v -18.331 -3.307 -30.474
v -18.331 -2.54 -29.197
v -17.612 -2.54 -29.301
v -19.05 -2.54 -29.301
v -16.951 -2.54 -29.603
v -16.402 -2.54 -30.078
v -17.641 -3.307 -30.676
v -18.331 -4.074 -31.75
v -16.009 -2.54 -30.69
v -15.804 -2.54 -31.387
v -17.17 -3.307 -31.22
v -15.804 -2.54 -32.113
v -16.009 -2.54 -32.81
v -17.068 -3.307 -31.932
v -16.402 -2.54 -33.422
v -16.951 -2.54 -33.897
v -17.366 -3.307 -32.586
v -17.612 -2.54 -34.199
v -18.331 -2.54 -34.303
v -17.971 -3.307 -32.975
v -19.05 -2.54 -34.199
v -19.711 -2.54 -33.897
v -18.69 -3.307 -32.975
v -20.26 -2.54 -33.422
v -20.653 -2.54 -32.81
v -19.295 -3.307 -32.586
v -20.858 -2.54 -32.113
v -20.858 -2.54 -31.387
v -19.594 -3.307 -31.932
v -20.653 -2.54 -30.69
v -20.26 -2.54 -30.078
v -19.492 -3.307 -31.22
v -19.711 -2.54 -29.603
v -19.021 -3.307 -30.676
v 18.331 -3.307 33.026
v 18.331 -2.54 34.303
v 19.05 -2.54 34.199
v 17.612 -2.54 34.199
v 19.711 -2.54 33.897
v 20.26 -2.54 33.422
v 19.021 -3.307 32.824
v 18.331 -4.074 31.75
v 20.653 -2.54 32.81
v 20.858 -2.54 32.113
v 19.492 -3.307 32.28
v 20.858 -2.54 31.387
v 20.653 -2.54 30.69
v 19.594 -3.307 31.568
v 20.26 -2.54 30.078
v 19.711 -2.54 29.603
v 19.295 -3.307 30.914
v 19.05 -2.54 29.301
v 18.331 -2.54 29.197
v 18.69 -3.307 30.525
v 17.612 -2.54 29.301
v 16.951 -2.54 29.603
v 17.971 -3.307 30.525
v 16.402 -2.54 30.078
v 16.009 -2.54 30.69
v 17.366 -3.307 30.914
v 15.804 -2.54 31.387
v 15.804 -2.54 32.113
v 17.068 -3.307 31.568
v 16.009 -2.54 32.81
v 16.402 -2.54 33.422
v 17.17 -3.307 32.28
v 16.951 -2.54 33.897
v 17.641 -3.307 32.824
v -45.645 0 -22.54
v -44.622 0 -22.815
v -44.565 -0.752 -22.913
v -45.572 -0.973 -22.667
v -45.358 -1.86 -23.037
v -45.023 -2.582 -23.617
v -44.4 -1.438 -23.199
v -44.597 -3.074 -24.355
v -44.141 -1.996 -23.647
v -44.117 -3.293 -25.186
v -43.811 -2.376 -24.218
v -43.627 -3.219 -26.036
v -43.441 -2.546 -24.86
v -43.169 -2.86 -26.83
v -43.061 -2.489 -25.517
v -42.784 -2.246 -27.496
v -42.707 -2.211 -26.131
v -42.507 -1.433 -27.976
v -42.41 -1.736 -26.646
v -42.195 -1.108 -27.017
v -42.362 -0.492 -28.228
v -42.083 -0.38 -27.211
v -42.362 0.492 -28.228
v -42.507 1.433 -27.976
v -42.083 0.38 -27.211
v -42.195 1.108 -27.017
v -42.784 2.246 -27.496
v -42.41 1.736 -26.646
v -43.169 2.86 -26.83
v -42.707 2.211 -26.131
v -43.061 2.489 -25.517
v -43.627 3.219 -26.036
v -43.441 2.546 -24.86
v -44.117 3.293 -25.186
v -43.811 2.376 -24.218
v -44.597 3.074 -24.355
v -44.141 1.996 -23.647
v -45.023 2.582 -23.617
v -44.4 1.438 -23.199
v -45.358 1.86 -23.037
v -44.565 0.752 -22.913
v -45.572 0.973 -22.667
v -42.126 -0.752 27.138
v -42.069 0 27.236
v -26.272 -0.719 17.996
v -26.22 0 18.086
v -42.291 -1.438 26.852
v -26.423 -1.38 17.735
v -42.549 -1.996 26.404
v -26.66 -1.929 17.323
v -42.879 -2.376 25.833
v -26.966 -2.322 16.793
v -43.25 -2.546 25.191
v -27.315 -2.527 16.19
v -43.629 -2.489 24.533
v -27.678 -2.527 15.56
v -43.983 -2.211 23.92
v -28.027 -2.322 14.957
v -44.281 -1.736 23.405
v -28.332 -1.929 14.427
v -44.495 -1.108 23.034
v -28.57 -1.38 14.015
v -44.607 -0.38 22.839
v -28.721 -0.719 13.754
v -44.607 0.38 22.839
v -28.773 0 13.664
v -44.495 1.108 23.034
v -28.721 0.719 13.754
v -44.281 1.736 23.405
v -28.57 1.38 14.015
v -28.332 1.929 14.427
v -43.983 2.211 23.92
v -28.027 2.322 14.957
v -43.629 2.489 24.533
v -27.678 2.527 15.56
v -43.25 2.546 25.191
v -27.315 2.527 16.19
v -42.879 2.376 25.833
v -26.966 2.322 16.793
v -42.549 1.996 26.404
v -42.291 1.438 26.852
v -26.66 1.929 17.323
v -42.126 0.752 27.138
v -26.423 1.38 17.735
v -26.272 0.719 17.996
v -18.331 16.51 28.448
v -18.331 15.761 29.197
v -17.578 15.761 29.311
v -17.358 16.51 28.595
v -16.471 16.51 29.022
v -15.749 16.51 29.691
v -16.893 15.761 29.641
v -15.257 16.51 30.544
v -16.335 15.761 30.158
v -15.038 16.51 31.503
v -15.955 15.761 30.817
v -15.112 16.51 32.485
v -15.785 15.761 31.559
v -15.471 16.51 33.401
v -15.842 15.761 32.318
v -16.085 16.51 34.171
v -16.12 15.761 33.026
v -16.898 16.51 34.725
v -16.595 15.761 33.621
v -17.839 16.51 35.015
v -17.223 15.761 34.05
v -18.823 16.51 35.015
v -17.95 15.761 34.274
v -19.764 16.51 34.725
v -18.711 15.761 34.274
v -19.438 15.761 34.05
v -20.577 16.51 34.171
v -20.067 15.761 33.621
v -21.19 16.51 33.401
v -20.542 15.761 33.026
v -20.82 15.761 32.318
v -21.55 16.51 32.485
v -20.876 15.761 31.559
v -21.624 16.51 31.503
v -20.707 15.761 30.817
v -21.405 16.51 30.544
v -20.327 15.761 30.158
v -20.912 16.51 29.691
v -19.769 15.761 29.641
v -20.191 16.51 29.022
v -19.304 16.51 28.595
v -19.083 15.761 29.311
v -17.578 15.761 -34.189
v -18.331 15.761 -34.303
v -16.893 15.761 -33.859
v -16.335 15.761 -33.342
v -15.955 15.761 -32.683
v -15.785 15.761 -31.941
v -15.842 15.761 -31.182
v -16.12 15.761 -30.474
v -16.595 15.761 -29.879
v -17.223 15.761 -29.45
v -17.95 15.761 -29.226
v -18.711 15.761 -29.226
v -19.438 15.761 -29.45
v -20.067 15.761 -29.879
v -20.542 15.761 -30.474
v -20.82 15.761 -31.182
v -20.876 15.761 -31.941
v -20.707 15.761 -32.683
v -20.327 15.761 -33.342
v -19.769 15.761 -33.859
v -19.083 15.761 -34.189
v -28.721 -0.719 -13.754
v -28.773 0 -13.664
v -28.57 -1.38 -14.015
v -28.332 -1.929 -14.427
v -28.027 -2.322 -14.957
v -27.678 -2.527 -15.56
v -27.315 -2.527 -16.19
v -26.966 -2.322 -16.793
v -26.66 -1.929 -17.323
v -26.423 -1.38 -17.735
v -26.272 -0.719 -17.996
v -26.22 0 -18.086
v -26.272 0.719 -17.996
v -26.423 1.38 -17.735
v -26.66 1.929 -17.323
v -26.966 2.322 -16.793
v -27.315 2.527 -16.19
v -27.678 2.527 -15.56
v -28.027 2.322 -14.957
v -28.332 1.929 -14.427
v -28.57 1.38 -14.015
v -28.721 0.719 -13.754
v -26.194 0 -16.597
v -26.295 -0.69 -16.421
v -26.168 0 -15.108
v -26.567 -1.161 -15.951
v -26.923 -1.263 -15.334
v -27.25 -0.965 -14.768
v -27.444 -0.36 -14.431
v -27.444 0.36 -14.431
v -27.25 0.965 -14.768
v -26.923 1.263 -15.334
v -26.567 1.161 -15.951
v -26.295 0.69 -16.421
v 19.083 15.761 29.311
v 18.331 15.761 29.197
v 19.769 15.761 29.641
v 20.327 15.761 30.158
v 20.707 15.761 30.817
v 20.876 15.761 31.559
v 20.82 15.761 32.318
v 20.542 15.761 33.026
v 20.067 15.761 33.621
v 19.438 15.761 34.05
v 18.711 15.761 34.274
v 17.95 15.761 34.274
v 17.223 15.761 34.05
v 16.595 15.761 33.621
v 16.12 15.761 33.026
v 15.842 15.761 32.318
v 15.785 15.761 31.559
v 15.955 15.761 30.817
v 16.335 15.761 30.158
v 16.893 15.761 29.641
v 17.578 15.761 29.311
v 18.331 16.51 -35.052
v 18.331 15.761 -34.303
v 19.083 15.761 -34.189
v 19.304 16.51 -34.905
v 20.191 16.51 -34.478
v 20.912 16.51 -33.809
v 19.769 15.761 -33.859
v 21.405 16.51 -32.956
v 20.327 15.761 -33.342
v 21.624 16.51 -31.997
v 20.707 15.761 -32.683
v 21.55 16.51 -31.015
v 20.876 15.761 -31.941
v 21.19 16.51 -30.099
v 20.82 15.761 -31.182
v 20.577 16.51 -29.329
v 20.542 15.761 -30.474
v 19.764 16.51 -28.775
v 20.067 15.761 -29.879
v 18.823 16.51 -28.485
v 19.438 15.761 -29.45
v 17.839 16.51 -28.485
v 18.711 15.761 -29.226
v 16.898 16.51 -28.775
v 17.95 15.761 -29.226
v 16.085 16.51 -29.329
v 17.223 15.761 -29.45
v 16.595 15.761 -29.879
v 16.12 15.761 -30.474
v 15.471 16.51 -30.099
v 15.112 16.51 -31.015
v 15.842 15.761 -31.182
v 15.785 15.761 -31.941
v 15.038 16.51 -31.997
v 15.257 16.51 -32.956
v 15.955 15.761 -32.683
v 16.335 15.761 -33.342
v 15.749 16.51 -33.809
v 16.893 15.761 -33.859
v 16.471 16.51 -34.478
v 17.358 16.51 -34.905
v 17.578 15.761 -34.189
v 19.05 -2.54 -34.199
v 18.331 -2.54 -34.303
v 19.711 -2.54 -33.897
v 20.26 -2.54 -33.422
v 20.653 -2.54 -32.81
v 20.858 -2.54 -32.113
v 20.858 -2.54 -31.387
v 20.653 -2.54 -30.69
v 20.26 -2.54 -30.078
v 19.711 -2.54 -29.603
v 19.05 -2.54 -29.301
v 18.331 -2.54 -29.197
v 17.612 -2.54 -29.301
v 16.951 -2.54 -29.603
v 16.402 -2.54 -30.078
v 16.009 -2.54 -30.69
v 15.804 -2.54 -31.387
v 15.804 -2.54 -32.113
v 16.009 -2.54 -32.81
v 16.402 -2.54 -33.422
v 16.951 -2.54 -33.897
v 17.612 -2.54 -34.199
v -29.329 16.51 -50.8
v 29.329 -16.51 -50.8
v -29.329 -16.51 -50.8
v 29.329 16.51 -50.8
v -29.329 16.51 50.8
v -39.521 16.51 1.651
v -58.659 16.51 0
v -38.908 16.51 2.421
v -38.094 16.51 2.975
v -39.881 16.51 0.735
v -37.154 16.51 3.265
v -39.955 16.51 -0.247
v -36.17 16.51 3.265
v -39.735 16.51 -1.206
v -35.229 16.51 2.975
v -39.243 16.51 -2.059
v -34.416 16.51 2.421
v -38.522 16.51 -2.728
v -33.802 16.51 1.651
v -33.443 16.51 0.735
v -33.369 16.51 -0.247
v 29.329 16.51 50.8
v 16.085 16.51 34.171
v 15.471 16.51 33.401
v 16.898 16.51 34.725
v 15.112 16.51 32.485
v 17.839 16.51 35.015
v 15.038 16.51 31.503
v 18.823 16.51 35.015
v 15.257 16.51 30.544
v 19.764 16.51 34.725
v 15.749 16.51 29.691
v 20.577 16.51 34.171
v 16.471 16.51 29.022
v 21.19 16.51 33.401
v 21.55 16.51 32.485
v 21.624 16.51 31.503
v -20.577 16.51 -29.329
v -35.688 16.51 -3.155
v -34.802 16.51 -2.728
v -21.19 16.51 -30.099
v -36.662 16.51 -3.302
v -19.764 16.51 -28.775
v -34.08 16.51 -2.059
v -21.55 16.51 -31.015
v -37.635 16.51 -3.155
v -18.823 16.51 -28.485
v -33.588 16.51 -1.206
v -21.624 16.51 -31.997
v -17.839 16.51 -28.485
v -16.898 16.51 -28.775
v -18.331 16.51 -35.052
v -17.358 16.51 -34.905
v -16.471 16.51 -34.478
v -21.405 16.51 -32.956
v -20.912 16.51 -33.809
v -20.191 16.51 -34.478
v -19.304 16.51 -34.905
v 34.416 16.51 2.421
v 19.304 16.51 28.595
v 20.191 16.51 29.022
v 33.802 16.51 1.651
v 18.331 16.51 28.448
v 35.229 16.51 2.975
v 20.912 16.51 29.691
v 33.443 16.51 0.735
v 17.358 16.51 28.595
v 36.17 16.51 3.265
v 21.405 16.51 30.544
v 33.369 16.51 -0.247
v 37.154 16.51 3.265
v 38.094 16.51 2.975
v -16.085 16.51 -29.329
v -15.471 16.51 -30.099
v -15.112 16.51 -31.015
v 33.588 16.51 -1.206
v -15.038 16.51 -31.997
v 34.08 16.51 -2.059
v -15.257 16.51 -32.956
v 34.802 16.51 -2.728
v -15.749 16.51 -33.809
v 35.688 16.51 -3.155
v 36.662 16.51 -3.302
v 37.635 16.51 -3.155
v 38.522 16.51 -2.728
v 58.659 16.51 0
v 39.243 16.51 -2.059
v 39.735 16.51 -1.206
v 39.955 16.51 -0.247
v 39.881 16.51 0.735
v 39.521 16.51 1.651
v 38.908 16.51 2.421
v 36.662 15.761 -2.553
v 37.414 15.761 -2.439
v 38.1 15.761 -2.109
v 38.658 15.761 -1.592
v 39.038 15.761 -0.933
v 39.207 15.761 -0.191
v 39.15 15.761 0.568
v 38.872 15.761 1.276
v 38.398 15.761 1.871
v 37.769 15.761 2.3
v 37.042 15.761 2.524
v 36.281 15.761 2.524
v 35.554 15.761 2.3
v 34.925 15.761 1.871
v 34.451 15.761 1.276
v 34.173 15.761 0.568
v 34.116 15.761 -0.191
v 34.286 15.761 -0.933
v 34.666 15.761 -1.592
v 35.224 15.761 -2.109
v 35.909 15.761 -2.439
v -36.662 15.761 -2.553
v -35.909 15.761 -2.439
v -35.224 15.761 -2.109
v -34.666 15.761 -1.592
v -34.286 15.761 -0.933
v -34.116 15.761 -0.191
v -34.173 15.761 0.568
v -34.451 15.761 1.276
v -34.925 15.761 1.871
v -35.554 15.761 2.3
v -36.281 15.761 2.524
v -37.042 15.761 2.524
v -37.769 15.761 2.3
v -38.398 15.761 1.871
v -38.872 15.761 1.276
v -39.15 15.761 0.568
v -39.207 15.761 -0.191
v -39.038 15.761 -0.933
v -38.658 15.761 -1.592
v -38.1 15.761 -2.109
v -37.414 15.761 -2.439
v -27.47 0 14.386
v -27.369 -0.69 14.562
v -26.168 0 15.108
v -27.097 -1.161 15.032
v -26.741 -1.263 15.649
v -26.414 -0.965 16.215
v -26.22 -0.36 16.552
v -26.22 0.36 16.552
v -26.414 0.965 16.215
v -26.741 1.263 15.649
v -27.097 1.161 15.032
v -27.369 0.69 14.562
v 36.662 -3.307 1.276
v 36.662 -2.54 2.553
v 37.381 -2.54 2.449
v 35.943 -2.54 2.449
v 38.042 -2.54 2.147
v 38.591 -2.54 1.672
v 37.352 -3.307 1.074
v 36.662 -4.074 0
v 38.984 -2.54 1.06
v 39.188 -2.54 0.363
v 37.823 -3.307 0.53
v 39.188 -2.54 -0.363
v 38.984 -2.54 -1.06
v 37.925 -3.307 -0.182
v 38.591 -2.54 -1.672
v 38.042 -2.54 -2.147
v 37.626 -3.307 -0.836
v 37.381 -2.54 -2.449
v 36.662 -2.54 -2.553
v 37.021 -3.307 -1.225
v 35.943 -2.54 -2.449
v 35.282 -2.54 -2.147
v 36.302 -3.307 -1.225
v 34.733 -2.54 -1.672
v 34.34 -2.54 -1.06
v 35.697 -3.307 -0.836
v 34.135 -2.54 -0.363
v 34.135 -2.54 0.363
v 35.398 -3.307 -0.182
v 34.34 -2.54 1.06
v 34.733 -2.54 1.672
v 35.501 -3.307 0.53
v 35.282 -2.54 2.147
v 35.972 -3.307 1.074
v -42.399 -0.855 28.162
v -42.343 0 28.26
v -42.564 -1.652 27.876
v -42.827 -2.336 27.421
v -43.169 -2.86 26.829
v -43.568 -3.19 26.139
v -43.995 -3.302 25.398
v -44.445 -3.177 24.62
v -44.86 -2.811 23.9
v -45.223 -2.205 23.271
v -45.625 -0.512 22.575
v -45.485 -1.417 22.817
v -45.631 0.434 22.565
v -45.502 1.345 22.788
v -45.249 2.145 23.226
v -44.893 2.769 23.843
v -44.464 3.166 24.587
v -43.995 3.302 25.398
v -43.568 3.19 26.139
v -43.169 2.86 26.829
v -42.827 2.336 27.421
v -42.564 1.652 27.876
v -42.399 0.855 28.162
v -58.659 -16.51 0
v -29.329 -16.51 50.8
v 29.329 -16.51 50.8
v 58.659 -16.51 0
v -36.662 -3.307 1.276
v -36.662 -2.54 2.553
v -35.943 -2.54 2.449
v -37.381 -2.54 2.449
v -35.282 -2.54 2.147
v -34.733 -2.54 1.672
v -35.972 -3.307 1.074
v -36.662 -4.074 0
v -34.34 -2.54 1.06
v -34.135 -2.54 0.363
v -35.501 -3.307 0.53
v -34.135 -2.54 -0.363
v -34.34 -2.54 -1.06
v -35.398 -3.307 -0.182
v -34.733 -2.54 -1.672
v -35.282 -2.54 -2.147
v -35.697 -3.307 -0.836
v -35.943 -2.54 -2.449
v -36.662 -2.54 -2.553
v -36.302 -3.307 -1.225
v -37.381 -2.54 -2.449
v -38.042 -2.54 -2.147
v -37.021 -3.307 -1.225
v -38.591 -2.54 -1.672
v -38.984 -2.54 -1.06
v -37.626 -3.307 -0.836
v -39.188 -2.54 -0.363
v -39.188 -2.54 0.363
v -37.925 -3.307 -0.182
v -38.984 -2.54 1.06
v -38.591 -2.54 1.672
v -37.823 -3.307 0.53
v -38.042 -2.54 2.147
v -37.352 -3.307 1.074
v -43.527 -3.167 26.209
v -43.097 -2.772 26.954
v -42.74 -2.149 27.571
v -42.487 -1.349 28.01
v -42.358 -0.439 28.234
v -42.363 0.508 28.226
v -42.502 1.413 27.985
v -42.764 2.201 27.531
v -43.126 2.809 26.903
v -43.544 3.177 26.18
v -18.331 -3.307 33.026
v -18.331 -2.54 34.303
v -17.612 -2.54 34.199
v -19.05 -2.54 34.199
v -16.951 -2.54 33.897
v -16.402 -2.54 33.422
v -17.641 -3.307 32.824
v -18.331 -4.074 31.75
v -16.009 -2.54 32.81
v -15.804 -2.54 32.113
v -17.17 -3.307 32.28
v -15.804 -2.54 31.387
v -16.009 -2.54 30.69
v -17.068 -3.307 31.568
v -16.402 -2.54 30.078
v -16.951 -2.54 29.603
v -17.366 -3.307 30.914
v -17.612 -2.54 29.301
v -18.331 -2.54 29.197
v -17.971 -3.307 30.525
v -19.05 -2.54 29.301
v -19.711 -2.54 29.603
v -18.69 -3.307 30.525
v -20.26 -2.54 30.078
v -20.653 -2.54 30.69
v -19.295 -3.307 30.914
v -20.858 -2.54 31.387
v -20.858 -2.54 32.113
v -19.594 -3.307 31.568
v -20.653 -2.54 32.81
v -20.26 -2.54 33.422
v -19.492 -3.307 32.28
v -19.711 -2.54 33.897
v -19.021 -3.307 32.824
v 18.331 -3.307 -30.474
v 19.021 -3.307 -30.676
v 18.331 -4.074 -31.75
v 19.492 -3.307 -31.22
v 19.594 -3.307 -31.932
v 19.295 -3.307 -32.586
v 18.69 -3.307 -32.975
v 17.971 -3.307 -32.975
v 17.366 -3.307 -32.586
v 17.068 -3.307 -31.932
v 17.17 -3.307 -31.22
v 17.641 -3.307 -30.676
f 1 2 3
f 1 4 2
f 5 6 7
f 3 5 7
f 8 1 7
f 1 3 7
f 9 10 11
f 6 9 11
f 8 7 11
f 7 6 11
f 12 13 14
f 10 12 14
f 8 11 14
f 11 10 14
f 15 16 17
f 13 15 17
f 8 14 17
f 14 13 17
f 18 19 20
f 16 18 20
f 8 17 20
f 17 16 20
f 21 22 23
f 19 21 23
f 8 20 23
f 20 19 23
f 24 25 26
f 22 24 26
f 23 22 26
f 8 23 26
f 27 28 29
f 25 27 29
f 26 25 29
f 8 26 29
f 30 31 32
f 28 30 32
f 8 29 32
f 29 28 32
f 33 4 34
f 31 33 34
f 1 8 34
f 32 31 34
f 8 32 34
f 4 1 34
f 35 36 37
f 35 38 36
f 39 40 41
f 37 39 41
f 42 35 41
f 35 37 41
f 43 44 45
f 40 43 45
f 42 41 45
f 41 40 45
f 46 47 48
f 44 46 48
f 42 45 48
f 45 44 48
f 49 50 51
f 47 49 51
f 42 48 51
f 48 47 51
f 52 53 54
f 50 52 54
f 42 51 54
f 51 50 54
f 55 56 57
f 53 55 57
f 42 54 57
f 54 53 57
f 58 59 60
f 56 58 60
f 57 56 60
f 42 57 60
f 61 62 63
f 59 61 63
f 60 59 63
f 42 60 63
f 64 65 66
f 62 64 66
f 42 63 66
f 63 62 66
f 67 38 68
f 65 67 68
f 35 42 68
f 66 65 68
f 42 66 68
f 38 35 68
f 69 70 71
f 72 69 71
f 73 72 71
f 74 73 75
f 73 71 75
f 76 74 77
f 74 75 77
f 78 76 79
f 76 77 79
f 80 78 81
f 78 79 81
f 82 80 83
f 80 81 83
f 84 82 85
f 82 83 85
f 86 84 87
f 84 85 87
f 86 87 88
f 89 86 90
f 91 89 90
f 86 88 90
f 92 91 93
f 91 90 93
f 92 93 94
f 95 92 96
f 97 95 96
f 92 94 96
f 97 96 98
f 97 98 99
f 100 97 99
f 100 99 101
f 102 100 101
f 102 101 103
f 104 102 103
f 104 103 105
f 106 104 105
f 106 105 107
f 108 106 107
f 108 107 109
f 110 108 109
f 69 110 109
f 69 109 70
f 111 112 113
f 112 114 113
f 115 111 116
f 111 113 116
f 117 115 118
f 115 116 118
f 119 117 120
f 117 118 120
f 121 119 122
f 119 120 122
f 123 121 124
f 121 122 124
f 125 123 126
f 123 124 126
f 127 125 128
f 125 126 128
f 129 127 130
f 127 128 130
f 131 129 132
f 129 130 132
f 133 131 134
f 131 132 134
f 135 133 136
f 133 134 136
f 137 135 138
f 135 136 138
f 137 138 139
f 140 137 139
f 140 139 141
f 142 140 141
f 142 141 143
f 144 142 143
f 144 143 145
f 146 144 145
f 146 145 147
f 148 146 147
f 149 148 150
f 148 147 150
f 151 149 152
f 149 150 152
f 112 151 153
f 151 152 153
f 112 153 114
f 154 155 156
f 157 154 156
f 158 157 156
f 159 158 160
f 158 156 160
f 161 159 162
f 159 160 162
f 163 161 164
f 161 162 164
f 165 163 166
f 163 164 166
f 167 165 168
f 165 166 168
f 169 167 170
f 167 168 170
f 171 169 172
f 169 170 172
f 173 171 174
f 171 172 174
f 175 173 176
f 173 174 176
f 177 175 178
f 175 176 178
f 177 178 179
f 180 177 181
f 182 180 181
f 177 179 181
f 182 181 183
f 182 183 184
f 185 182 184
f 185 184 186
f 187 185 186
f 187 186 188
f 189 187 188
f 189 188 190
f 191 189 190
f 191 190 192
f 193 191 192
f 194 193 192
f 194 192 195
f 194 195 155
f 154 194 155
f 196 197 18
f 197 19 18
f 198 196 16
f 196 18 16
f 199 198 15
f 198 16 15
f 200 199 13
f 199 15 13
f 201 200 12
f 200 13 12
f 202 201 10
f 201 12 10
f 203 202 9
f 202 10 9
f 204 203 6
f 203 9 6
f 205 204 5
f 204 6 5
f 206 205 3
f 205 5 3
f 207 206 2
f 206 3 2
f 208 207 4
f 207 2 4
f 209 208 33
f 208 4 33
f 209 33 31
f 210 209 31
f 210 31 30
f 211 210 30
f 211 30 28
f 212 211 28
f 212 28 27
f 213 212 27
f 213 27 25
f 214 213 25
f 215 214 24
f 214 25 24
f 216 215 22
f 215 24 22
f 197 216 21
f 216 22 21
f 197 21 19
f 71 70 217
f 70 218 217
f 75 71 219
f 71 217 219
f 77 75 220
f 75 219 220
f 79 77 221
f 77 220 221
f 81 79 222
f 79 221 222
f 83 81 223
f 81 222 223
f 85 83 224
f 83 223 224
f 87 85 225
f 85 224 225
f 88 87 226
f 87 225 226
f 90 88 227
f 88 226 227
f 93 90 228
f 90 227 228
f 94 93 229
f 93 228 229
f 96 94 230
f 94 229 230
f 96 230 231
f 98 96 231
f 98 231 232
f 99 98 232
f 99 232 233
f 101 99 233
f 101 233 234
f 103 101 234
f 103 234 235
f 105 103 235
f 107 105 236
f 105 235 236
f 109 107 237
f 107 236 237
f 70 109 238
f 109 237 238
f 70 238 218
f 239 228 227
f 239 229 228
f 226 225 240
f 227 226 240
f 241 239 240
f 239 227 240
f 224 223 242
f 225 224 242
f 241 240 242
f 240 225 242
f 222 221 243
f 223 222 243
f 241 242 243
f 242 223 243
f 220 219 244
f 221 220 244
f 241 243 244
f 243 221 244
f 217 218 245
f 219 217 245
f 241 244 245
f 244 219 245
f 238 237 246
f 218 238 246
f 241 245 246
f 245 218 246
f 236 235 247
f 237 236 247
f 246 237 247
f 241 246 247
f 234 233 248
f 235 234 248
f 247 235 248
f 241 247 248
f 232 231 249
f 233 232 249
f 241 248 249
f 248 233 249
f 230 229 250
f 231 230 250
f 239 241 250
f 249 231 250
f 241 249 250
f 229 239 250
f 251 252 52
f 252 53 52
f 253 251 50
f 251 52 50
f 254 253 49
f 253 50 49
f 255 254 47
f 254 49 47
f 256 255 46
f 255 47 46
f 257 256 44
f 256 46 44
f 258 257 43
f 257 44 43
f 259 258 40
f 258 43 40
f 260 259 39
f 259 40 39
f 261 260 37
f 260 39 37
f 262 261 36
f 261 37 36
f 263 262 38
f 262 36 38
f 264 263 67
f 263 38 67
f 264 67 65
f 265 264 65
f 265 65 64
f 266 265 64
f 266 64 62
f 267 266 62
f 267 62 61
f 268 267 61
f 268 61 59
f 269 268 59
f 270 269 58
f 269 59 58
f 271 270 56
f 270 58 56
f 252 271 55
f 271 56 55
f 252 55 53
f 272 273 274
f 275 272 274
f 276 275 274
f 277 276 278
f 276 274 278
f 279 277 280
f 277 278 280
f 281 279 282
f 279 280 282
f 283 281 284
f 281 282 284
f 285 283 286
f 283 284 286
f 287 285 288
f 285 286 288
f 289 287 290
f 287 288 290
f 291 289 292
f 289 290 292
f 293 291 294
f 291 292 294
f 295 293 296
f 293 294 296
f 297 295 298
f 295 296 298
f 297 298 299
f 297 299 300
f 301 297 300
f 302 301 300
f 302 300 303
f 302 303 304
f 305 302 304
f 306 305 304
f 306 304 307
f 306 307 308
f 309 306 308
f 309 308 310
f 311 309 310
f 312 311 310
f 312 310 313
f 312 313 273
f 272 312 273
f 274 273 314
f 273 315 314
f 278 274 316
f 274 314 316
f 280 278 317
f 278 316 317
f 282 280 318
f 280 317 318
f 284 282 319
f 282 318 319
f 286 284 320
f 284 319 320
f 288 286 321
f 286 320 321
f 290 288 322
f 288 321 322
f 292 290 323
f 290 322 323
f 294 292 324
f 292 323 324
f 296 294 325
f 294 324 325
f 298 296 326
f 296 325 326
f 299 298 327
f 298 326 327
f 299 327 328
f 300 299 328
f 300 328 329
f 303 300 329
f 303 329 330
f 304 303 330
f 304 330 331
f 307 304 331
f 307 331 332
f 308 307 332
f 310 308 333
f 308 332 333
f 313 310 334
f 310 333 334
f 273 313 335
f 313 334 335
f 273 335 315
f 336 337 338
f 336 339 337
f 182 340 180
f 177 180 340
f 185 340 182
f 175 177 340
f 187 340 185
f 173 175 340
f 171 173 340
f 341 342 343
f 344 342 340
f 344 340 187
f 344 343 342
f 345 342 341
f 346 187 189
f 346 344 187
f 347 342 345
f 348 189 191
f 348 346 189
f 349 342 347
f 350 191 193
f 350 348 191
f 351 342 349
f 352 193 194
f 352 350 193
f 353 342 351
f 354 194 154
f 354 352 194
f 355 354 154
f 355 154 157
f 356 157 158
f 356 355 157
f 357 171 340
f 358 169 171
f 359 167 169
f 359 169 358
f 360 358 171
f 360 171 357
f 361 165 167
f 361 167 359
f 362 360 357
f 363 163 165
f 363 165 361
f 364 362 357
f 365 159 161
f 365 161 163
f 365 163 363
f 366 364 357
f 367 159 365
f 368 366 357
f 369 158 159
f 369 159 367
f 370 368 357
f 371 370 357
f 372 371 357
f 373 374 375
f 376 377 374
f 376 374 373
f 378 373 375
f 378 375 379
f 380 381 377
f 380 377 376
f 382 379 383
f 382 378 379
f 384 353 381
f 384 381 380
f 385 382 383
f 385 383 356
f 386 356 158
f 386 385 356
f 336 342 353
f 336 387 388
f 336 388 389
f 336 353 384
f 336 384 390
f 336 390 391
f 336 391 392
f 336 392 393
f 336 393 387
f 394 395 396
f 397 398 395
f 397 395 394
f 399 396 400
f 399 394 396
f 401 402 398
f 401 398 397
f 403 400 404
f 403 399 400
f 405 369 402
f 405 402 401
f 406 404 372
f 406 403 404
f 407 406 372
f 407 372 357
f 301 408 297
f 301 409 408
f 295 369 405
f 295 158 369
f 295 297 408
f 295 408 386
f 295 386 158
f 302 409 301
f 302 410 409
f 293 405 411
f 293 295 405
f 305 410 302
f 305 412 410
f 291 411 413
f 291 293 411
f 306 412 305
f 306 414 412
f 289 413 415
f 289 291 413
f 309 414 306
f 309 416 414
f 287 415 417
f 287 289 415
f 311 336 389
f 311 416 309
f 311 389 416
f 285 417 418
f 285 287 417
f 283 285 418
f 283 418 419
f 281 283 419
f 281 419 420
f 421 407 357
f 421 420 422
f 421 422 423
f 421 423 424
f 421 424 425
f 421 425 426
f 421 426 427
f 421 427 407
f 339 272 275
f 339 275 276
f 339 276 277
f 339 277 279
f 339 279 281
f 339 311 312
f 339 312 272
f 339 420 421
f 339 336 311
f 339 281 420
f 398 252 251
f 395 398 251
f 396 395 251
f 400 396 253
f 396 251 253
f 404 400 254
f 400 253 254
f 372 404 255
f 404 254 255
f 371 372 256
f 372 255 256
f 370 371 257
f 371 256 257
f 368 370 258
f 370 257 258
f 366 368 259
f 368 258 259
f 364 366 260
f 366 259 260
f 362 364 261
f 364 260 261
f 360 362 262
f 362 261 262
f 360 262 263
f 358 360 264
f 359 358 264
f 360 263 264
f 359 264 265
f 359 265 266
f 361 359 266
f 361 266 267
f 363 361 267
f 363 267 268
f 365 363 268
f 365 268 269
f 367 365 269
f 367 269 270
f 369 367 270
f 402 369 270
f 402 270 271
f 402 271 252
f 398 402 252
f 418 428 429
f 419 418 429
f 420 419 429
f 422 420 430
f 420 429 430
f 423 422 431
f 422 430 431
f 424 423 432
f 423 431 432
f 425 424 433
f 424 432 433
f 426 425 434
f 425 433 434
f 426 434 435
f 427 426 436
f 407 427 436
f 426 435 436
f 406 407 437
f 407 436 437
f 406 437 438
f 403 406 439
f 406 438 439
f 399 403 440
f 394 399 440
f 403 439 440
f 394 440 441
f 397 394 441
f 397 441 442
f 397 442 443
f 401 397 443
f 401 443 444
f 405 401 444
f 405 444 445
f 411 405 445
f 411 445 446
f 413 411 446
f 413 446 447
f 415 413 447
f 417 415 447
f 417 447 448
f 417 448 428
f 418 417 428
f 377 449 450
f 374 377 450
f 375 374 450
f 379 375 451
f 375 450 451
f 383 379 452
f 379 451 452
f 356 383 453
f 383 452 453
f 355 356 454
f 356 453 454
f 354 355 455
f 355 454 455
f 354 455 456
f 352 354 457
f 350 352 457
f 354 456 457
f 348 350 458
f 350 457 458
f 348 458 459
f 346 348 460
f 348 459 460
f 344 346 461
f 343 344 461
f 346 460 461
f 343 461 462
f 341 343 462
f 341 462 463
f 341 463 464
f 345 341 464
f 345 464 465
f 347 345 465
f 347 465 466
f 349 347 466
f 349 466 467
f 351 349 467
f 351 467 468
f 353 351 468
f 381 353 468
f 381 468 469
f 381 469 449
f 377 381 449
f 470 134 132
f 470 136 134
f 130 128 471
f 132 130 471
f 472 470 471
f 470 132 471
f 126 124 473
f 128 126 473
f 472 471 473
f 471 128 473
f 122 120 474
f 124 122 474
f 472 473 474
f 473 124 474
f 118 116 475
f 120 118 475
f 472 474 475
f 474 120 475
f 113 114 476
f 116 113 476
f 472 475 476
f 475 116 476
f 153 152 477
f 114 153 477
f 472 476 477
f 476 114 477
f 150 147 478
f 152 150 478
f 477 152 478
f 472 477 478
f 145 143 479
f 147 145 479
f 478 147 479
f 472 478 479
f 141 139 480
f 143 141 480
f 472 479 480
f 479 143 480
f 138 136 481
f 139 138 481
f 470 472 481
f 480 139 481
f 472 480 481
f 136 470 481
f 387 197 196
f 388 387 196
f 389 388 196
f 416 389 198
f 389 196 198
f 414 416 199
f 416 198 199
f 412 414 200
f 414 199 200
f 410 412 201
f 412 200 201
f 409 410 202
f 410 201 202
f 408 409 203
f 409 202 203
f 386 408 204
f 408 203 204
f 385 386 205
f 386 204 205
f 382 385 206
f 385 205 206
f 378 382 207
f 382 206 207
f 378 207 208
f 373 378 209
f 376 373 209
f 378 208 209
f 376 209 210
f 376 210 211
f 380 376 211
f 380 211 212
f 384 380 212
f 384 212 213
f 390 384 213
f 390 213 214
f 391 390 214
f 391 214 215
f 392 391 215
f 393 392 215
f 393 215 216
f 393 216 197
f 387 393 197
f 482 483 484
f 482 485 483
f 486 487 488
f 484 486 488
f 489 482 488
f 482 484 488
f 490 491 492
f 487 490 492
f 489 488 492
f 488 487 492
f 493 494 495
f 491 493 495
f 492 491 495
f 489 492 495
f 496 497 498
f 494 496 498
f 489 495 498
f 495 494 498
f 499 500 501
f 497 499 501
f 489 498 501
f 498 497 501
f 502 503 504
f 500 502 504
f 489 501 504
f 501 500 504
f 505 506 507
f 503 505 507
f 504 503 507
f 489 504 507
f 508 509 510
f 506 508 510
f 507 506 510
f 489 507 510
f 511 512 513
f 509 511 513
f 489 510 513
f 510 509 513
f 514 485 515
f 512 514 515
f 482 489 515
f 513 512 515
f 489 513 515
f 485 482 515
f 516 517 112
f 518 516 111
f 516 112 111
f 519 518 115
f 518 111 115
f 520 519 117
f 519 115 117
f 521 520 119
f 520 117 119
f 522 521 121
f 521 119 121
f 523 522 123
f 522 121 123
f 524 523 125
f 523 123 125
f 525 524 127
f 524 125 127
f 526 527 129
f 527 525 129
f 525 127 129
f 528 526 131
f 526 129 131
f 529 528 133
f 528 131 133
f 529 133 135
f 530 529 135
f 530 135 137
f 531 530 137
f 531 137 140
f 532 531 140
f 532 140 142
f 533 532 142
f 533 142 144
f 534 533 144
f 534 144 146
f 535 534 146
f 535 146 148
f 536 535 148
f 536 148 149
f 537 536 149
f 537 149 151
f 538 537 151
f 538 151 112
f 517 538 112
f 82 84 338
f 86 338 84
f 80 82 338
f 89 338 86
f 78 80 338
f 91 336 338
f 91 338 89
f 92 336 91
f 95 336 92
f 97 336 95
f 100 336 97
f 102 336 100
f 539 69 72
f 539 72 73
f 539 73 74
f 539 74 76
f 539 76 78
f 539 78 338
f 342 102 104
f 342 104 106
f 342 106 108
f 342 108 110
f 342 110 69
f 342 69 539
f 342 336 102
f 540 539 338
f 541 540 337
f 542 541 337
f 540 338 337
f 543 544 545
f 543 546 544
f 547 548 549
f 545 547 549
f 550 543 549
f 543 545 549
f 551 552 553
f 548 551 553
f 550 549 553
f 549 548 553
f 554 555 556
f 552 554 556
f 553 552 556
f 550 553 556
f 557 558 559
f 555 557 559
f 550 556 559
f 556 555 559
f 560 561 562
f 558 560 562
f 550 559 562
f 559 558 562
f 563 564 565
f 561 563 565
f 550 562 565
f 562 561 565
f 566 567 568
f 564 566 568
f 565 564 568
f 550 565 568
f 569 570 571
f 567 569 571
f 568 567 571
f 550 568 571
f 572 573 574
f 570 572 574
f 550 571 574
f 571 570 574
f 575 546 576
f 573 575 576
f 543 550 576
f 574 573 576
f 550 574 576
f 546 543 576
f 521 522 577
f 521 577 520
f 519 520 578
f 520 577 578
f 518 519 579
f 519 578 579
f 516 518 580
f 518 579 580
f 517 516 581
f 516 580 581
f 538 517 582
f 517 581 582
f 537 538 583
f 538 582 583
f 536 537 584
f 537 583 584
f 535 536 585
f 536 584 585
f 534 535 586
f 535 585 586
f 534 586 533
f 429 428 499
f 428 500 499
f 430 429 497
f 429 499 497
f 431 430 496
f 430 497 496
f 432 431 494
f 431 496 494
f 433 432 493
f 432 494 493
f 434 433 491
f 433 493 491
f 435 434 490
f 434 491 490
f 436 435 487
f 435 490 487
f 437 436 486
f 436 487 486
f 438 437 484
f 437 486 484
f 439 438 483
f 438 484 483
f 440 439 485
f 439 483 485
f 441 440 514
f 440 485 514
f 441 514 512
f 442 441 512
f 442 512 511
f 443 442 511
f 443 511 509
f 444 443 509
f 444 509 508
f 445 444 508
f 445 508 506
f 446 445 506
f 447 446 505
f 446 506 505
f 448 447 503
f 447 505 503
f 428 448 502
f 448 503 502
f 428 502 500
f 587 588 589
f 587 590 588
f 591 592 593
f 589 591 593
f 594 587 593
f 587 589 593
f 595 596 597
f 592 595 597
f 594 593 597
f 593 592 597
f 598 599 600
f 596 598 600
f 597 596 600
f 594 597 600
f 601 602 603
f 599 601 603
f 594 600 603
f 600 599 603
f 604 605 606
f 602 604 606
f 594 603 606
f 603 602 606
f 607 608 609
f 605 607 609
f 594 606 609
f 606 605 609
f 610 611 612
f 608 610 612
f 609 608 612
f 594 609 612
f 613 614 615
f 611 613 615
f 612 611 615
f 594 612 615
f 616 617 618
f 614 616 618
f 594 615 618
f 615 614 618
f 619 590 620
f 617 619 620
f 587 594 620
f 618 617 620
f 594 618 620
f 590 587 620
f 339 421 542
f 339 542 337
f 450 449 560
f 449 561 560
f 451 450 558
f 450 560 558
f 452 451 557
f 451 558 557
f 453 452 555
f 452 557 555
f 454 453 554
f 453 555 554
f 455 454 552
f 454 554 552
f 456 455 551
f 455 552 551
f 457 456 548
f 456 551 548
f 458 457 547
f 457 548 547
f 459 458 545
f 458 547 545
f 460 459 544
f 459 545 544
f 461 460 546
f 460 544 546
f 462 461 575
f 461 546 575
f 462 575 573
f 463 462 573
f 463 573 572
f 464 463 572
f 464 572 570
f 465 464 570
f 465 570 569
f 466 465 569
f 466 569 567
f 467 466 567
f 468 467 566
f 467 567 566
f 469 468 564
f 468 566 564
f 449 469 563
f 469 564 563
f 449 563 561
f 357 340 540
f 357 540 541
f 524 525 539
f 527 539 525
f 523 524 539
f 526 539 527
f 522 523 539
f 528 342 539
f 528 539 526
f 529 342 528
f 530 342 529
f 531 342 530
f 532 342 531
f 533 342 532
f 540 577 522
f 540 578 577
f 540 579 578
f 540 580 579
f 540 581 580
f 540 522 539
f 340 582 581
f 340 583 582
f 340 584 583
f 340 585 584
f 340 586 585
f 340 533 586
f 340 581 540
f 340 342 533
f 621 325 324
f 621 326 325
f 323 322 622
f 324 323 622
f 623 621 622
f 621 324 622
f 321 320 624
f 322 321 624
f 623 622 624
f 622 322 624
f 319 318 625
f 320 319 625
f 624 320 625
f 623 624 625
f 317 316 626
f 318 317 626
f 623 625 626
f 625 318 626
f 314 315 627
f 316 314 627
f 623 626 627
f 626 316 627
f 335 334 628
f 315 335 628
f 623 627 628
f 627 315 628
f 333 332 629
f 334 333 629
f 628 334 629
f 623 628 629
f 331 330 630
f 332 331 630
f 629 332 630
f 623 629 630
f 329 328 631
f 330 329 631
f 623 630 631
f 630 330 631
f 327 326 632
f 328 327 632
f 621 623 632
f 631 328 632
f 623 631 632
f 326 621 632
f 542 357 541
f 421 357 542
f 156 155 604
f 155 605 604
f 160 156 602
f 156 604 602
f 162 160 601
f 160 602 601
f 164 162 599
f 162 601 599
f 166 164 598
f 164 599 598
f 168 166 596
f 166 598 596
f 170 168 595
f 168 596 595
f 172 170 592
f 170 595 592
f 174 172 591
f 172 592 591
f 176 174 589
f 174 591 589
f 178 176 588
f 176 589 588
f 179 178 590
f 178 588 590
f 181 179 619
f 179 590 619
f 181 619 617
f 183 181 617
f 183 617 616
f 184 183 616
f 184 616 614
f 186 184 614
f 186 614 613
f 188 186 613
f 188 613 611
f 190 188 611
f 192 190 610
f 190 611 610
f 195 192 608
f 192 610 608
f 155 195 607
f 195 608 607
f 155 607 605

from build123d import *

# Parameters (mm, degrees)
BOSS_EXTRUDE1_DEPTH                         = 16.51
F_1_4_20_TAPPED_HOLE1_D                     = 5.1054
F_1_4_20_TAPPED_HOLE1_DEPTH                 = 19.05
F_1_4_20_TAPPED_HOLE1_CSINK_D               = 6.604
F_1_4_20_TAPPED_HOLE1_CSINK_ANGLE           = 90
F_1_4_20_TAPPED_HOLE1_TIP                   = 1.533816902
F_1_4_20_TAPPED_HOLE1_ON_FACE_2_D           = 5.1054
F_1_4_20_TAPPED_HOLE1_ON_FACE_2_DEPTH       = 19.05
F_1_4_20_TAPPED_HOLE1_ON_FACE_2_CSINK_D     = 6.604
F_1_4_20_TAPPED_HOLE1_ON_FACE_2_CSINK_ANGLE = 90
F_1_4_20_TAPPED_HOLE1_ON_FACE_2_TIP         = 1.533816902
F_1_4_20_TAPPED_HOLE1_ON_FACE_3_D           = 5.1054
F_1_4_20_TAPPED_HOLE1_ON_FACE_3_DEPTH       = 19.05
F_1_4_20_TAPPED_HOLE1_ON_FACE_3_CSINK_D     = 6.604
F_1_4_20_TAPPED_HOLE1_ON_FACE_3_CSINK_ANGLE = 90
F_1_4_20_TAPPED_HOLE1_ON_FACE_3_TIP         = 1.533816902


with BuildPart() as part:
    # Sketch1 → Boss-Extrude1 (new, symmetric)
    with BuildSketch(Plane(origin=(0, 0, 0), x_dir=(1, 0, 0), z_dir=(0, 1, 0))):
        Polygon((-58.65878735, 0), (-29.329393675, -50.8), (29.329393675, -50.8), (58.65878735, 0), (29.329393675, 50.8), (-29.329393675, 50.8), align=None)
    extrude(amount=BOSS_EXTRUDE1_DEPTH, both=True)

    # 1/4-20 Tapped Hole1
    with Locations(Plane(origin=(-43.994090512, 0, -25.4), x_dir=(0.5, 0, -0.866025403784), z_dir=(-0.866025403784, 0, -0.5))):
        with Locations((0, 0)):
            CounterSinkHole(F_1_4_20_TAPPED_HOLE1_D / 2, F_1_4_20_TAPPED_HOLE1_CSINK_D / 2, depth=F_1_4_20_TAPPED_HOLE1_DEPTH, counter_sink_angle=F_1_4_20_TAPPED_HOLE1_CSINK_ANGLE)
            with Locations((0, 0, -(F_1_4_20_TAPPED_HOLE1_DEPTH + F_1_4_20_TAPPED_HOLE1_TIP / 2))):  # 118° drill point
                Cone(0, F_1_4_20_TAPPED_HOLE1_D / 2, F_1_4_20_TAPPED_HOLE1_TIP, mode=Mode.SUBTRACT)

    # 1/4-20 Tapped Hole1 on face 2
    with Locations(Plane(origin=(-43.994090512, 0, 25.4), x_dir=(-0.500000174844, 0, -0.866025302838), z_dir=(-0.866025302838, 0, 0.500000174844))):
        with Locations((0, 0)):
            CounterSinkHole(F_1_4_20_TAPPED_HOLE1_ON_FACE_2_D / 2, F_1_4_20_TAPPED_HOLE1_ON_FACE_2_CSINK_D / 2, depth=F_1_4_20_TAPPED_HOLE1_ON_FACE_2_DEPTH, counter_sink_angle=F_1_4_20_TAPPED_HOLE1_ON_FACE_2_CSINK_ANGLE)
            with Locations((0, 0, -(F_1_4_20_TAPPED_HOLE1_ON_FACE_2_DEPTH + F_1_4_20_TAPPED_HOLE1_ON_FACE_2_TIP / 2))):  # 118° drill point
                Cone(0, F_1_4_20_TAPPED_HOLE1_ON_FACE_2_D / 2, F_1_4_20_TAPPED_HOLE1_ON_FACE_2_TIP, mode=Mode.SUBTRACT)

    # 1/4-20 Tapped Hole1 on face 3
    with Locations(Plane(origin=(18.330871047, 16.51, 31.75), x_dir=(0, 0, 1), z_dir=(0, 1, 0))):
        with Locations((0, 0), (-31.75, 18.330871047), (-63.5, -36.661742094), (-31.75, -54.992613141), (0, -36.661742094), (-63.5, 0)):
            CounterSinkHole(F_1_4_20_TAPPED_HOLE1_ON_FACE_3_D / 2, F_1_4_20_TAPPED_HOLE1_ON_FACE_3_CSINK_D / 2, depth=F_1_4_20_TAPPED_HOLE1_ON_FACE_3_DEPTH, counter_sink_angle=F_1_4_20_TAPPED_HOLE1_ON_FACE_3_CSINK_ANGLE)
            with Locations((0, 0, -(F_1_4_20_TAPPED_HOLE1_ON_FACE_3_DEPTH + F_1_4_20_TAPPED_HOLE1_ON_FACE_3_TIP / 2))):  # 118° drill point
                Cone(0, F_1_4_20_TAPPED_HOLE1_ON_FACE_3_D / 2, F_1_4_20_TAPPED_HOLE1_ON_FACE_3_TIP, mode=Mode.SUBTRACT)


solid = part.part
